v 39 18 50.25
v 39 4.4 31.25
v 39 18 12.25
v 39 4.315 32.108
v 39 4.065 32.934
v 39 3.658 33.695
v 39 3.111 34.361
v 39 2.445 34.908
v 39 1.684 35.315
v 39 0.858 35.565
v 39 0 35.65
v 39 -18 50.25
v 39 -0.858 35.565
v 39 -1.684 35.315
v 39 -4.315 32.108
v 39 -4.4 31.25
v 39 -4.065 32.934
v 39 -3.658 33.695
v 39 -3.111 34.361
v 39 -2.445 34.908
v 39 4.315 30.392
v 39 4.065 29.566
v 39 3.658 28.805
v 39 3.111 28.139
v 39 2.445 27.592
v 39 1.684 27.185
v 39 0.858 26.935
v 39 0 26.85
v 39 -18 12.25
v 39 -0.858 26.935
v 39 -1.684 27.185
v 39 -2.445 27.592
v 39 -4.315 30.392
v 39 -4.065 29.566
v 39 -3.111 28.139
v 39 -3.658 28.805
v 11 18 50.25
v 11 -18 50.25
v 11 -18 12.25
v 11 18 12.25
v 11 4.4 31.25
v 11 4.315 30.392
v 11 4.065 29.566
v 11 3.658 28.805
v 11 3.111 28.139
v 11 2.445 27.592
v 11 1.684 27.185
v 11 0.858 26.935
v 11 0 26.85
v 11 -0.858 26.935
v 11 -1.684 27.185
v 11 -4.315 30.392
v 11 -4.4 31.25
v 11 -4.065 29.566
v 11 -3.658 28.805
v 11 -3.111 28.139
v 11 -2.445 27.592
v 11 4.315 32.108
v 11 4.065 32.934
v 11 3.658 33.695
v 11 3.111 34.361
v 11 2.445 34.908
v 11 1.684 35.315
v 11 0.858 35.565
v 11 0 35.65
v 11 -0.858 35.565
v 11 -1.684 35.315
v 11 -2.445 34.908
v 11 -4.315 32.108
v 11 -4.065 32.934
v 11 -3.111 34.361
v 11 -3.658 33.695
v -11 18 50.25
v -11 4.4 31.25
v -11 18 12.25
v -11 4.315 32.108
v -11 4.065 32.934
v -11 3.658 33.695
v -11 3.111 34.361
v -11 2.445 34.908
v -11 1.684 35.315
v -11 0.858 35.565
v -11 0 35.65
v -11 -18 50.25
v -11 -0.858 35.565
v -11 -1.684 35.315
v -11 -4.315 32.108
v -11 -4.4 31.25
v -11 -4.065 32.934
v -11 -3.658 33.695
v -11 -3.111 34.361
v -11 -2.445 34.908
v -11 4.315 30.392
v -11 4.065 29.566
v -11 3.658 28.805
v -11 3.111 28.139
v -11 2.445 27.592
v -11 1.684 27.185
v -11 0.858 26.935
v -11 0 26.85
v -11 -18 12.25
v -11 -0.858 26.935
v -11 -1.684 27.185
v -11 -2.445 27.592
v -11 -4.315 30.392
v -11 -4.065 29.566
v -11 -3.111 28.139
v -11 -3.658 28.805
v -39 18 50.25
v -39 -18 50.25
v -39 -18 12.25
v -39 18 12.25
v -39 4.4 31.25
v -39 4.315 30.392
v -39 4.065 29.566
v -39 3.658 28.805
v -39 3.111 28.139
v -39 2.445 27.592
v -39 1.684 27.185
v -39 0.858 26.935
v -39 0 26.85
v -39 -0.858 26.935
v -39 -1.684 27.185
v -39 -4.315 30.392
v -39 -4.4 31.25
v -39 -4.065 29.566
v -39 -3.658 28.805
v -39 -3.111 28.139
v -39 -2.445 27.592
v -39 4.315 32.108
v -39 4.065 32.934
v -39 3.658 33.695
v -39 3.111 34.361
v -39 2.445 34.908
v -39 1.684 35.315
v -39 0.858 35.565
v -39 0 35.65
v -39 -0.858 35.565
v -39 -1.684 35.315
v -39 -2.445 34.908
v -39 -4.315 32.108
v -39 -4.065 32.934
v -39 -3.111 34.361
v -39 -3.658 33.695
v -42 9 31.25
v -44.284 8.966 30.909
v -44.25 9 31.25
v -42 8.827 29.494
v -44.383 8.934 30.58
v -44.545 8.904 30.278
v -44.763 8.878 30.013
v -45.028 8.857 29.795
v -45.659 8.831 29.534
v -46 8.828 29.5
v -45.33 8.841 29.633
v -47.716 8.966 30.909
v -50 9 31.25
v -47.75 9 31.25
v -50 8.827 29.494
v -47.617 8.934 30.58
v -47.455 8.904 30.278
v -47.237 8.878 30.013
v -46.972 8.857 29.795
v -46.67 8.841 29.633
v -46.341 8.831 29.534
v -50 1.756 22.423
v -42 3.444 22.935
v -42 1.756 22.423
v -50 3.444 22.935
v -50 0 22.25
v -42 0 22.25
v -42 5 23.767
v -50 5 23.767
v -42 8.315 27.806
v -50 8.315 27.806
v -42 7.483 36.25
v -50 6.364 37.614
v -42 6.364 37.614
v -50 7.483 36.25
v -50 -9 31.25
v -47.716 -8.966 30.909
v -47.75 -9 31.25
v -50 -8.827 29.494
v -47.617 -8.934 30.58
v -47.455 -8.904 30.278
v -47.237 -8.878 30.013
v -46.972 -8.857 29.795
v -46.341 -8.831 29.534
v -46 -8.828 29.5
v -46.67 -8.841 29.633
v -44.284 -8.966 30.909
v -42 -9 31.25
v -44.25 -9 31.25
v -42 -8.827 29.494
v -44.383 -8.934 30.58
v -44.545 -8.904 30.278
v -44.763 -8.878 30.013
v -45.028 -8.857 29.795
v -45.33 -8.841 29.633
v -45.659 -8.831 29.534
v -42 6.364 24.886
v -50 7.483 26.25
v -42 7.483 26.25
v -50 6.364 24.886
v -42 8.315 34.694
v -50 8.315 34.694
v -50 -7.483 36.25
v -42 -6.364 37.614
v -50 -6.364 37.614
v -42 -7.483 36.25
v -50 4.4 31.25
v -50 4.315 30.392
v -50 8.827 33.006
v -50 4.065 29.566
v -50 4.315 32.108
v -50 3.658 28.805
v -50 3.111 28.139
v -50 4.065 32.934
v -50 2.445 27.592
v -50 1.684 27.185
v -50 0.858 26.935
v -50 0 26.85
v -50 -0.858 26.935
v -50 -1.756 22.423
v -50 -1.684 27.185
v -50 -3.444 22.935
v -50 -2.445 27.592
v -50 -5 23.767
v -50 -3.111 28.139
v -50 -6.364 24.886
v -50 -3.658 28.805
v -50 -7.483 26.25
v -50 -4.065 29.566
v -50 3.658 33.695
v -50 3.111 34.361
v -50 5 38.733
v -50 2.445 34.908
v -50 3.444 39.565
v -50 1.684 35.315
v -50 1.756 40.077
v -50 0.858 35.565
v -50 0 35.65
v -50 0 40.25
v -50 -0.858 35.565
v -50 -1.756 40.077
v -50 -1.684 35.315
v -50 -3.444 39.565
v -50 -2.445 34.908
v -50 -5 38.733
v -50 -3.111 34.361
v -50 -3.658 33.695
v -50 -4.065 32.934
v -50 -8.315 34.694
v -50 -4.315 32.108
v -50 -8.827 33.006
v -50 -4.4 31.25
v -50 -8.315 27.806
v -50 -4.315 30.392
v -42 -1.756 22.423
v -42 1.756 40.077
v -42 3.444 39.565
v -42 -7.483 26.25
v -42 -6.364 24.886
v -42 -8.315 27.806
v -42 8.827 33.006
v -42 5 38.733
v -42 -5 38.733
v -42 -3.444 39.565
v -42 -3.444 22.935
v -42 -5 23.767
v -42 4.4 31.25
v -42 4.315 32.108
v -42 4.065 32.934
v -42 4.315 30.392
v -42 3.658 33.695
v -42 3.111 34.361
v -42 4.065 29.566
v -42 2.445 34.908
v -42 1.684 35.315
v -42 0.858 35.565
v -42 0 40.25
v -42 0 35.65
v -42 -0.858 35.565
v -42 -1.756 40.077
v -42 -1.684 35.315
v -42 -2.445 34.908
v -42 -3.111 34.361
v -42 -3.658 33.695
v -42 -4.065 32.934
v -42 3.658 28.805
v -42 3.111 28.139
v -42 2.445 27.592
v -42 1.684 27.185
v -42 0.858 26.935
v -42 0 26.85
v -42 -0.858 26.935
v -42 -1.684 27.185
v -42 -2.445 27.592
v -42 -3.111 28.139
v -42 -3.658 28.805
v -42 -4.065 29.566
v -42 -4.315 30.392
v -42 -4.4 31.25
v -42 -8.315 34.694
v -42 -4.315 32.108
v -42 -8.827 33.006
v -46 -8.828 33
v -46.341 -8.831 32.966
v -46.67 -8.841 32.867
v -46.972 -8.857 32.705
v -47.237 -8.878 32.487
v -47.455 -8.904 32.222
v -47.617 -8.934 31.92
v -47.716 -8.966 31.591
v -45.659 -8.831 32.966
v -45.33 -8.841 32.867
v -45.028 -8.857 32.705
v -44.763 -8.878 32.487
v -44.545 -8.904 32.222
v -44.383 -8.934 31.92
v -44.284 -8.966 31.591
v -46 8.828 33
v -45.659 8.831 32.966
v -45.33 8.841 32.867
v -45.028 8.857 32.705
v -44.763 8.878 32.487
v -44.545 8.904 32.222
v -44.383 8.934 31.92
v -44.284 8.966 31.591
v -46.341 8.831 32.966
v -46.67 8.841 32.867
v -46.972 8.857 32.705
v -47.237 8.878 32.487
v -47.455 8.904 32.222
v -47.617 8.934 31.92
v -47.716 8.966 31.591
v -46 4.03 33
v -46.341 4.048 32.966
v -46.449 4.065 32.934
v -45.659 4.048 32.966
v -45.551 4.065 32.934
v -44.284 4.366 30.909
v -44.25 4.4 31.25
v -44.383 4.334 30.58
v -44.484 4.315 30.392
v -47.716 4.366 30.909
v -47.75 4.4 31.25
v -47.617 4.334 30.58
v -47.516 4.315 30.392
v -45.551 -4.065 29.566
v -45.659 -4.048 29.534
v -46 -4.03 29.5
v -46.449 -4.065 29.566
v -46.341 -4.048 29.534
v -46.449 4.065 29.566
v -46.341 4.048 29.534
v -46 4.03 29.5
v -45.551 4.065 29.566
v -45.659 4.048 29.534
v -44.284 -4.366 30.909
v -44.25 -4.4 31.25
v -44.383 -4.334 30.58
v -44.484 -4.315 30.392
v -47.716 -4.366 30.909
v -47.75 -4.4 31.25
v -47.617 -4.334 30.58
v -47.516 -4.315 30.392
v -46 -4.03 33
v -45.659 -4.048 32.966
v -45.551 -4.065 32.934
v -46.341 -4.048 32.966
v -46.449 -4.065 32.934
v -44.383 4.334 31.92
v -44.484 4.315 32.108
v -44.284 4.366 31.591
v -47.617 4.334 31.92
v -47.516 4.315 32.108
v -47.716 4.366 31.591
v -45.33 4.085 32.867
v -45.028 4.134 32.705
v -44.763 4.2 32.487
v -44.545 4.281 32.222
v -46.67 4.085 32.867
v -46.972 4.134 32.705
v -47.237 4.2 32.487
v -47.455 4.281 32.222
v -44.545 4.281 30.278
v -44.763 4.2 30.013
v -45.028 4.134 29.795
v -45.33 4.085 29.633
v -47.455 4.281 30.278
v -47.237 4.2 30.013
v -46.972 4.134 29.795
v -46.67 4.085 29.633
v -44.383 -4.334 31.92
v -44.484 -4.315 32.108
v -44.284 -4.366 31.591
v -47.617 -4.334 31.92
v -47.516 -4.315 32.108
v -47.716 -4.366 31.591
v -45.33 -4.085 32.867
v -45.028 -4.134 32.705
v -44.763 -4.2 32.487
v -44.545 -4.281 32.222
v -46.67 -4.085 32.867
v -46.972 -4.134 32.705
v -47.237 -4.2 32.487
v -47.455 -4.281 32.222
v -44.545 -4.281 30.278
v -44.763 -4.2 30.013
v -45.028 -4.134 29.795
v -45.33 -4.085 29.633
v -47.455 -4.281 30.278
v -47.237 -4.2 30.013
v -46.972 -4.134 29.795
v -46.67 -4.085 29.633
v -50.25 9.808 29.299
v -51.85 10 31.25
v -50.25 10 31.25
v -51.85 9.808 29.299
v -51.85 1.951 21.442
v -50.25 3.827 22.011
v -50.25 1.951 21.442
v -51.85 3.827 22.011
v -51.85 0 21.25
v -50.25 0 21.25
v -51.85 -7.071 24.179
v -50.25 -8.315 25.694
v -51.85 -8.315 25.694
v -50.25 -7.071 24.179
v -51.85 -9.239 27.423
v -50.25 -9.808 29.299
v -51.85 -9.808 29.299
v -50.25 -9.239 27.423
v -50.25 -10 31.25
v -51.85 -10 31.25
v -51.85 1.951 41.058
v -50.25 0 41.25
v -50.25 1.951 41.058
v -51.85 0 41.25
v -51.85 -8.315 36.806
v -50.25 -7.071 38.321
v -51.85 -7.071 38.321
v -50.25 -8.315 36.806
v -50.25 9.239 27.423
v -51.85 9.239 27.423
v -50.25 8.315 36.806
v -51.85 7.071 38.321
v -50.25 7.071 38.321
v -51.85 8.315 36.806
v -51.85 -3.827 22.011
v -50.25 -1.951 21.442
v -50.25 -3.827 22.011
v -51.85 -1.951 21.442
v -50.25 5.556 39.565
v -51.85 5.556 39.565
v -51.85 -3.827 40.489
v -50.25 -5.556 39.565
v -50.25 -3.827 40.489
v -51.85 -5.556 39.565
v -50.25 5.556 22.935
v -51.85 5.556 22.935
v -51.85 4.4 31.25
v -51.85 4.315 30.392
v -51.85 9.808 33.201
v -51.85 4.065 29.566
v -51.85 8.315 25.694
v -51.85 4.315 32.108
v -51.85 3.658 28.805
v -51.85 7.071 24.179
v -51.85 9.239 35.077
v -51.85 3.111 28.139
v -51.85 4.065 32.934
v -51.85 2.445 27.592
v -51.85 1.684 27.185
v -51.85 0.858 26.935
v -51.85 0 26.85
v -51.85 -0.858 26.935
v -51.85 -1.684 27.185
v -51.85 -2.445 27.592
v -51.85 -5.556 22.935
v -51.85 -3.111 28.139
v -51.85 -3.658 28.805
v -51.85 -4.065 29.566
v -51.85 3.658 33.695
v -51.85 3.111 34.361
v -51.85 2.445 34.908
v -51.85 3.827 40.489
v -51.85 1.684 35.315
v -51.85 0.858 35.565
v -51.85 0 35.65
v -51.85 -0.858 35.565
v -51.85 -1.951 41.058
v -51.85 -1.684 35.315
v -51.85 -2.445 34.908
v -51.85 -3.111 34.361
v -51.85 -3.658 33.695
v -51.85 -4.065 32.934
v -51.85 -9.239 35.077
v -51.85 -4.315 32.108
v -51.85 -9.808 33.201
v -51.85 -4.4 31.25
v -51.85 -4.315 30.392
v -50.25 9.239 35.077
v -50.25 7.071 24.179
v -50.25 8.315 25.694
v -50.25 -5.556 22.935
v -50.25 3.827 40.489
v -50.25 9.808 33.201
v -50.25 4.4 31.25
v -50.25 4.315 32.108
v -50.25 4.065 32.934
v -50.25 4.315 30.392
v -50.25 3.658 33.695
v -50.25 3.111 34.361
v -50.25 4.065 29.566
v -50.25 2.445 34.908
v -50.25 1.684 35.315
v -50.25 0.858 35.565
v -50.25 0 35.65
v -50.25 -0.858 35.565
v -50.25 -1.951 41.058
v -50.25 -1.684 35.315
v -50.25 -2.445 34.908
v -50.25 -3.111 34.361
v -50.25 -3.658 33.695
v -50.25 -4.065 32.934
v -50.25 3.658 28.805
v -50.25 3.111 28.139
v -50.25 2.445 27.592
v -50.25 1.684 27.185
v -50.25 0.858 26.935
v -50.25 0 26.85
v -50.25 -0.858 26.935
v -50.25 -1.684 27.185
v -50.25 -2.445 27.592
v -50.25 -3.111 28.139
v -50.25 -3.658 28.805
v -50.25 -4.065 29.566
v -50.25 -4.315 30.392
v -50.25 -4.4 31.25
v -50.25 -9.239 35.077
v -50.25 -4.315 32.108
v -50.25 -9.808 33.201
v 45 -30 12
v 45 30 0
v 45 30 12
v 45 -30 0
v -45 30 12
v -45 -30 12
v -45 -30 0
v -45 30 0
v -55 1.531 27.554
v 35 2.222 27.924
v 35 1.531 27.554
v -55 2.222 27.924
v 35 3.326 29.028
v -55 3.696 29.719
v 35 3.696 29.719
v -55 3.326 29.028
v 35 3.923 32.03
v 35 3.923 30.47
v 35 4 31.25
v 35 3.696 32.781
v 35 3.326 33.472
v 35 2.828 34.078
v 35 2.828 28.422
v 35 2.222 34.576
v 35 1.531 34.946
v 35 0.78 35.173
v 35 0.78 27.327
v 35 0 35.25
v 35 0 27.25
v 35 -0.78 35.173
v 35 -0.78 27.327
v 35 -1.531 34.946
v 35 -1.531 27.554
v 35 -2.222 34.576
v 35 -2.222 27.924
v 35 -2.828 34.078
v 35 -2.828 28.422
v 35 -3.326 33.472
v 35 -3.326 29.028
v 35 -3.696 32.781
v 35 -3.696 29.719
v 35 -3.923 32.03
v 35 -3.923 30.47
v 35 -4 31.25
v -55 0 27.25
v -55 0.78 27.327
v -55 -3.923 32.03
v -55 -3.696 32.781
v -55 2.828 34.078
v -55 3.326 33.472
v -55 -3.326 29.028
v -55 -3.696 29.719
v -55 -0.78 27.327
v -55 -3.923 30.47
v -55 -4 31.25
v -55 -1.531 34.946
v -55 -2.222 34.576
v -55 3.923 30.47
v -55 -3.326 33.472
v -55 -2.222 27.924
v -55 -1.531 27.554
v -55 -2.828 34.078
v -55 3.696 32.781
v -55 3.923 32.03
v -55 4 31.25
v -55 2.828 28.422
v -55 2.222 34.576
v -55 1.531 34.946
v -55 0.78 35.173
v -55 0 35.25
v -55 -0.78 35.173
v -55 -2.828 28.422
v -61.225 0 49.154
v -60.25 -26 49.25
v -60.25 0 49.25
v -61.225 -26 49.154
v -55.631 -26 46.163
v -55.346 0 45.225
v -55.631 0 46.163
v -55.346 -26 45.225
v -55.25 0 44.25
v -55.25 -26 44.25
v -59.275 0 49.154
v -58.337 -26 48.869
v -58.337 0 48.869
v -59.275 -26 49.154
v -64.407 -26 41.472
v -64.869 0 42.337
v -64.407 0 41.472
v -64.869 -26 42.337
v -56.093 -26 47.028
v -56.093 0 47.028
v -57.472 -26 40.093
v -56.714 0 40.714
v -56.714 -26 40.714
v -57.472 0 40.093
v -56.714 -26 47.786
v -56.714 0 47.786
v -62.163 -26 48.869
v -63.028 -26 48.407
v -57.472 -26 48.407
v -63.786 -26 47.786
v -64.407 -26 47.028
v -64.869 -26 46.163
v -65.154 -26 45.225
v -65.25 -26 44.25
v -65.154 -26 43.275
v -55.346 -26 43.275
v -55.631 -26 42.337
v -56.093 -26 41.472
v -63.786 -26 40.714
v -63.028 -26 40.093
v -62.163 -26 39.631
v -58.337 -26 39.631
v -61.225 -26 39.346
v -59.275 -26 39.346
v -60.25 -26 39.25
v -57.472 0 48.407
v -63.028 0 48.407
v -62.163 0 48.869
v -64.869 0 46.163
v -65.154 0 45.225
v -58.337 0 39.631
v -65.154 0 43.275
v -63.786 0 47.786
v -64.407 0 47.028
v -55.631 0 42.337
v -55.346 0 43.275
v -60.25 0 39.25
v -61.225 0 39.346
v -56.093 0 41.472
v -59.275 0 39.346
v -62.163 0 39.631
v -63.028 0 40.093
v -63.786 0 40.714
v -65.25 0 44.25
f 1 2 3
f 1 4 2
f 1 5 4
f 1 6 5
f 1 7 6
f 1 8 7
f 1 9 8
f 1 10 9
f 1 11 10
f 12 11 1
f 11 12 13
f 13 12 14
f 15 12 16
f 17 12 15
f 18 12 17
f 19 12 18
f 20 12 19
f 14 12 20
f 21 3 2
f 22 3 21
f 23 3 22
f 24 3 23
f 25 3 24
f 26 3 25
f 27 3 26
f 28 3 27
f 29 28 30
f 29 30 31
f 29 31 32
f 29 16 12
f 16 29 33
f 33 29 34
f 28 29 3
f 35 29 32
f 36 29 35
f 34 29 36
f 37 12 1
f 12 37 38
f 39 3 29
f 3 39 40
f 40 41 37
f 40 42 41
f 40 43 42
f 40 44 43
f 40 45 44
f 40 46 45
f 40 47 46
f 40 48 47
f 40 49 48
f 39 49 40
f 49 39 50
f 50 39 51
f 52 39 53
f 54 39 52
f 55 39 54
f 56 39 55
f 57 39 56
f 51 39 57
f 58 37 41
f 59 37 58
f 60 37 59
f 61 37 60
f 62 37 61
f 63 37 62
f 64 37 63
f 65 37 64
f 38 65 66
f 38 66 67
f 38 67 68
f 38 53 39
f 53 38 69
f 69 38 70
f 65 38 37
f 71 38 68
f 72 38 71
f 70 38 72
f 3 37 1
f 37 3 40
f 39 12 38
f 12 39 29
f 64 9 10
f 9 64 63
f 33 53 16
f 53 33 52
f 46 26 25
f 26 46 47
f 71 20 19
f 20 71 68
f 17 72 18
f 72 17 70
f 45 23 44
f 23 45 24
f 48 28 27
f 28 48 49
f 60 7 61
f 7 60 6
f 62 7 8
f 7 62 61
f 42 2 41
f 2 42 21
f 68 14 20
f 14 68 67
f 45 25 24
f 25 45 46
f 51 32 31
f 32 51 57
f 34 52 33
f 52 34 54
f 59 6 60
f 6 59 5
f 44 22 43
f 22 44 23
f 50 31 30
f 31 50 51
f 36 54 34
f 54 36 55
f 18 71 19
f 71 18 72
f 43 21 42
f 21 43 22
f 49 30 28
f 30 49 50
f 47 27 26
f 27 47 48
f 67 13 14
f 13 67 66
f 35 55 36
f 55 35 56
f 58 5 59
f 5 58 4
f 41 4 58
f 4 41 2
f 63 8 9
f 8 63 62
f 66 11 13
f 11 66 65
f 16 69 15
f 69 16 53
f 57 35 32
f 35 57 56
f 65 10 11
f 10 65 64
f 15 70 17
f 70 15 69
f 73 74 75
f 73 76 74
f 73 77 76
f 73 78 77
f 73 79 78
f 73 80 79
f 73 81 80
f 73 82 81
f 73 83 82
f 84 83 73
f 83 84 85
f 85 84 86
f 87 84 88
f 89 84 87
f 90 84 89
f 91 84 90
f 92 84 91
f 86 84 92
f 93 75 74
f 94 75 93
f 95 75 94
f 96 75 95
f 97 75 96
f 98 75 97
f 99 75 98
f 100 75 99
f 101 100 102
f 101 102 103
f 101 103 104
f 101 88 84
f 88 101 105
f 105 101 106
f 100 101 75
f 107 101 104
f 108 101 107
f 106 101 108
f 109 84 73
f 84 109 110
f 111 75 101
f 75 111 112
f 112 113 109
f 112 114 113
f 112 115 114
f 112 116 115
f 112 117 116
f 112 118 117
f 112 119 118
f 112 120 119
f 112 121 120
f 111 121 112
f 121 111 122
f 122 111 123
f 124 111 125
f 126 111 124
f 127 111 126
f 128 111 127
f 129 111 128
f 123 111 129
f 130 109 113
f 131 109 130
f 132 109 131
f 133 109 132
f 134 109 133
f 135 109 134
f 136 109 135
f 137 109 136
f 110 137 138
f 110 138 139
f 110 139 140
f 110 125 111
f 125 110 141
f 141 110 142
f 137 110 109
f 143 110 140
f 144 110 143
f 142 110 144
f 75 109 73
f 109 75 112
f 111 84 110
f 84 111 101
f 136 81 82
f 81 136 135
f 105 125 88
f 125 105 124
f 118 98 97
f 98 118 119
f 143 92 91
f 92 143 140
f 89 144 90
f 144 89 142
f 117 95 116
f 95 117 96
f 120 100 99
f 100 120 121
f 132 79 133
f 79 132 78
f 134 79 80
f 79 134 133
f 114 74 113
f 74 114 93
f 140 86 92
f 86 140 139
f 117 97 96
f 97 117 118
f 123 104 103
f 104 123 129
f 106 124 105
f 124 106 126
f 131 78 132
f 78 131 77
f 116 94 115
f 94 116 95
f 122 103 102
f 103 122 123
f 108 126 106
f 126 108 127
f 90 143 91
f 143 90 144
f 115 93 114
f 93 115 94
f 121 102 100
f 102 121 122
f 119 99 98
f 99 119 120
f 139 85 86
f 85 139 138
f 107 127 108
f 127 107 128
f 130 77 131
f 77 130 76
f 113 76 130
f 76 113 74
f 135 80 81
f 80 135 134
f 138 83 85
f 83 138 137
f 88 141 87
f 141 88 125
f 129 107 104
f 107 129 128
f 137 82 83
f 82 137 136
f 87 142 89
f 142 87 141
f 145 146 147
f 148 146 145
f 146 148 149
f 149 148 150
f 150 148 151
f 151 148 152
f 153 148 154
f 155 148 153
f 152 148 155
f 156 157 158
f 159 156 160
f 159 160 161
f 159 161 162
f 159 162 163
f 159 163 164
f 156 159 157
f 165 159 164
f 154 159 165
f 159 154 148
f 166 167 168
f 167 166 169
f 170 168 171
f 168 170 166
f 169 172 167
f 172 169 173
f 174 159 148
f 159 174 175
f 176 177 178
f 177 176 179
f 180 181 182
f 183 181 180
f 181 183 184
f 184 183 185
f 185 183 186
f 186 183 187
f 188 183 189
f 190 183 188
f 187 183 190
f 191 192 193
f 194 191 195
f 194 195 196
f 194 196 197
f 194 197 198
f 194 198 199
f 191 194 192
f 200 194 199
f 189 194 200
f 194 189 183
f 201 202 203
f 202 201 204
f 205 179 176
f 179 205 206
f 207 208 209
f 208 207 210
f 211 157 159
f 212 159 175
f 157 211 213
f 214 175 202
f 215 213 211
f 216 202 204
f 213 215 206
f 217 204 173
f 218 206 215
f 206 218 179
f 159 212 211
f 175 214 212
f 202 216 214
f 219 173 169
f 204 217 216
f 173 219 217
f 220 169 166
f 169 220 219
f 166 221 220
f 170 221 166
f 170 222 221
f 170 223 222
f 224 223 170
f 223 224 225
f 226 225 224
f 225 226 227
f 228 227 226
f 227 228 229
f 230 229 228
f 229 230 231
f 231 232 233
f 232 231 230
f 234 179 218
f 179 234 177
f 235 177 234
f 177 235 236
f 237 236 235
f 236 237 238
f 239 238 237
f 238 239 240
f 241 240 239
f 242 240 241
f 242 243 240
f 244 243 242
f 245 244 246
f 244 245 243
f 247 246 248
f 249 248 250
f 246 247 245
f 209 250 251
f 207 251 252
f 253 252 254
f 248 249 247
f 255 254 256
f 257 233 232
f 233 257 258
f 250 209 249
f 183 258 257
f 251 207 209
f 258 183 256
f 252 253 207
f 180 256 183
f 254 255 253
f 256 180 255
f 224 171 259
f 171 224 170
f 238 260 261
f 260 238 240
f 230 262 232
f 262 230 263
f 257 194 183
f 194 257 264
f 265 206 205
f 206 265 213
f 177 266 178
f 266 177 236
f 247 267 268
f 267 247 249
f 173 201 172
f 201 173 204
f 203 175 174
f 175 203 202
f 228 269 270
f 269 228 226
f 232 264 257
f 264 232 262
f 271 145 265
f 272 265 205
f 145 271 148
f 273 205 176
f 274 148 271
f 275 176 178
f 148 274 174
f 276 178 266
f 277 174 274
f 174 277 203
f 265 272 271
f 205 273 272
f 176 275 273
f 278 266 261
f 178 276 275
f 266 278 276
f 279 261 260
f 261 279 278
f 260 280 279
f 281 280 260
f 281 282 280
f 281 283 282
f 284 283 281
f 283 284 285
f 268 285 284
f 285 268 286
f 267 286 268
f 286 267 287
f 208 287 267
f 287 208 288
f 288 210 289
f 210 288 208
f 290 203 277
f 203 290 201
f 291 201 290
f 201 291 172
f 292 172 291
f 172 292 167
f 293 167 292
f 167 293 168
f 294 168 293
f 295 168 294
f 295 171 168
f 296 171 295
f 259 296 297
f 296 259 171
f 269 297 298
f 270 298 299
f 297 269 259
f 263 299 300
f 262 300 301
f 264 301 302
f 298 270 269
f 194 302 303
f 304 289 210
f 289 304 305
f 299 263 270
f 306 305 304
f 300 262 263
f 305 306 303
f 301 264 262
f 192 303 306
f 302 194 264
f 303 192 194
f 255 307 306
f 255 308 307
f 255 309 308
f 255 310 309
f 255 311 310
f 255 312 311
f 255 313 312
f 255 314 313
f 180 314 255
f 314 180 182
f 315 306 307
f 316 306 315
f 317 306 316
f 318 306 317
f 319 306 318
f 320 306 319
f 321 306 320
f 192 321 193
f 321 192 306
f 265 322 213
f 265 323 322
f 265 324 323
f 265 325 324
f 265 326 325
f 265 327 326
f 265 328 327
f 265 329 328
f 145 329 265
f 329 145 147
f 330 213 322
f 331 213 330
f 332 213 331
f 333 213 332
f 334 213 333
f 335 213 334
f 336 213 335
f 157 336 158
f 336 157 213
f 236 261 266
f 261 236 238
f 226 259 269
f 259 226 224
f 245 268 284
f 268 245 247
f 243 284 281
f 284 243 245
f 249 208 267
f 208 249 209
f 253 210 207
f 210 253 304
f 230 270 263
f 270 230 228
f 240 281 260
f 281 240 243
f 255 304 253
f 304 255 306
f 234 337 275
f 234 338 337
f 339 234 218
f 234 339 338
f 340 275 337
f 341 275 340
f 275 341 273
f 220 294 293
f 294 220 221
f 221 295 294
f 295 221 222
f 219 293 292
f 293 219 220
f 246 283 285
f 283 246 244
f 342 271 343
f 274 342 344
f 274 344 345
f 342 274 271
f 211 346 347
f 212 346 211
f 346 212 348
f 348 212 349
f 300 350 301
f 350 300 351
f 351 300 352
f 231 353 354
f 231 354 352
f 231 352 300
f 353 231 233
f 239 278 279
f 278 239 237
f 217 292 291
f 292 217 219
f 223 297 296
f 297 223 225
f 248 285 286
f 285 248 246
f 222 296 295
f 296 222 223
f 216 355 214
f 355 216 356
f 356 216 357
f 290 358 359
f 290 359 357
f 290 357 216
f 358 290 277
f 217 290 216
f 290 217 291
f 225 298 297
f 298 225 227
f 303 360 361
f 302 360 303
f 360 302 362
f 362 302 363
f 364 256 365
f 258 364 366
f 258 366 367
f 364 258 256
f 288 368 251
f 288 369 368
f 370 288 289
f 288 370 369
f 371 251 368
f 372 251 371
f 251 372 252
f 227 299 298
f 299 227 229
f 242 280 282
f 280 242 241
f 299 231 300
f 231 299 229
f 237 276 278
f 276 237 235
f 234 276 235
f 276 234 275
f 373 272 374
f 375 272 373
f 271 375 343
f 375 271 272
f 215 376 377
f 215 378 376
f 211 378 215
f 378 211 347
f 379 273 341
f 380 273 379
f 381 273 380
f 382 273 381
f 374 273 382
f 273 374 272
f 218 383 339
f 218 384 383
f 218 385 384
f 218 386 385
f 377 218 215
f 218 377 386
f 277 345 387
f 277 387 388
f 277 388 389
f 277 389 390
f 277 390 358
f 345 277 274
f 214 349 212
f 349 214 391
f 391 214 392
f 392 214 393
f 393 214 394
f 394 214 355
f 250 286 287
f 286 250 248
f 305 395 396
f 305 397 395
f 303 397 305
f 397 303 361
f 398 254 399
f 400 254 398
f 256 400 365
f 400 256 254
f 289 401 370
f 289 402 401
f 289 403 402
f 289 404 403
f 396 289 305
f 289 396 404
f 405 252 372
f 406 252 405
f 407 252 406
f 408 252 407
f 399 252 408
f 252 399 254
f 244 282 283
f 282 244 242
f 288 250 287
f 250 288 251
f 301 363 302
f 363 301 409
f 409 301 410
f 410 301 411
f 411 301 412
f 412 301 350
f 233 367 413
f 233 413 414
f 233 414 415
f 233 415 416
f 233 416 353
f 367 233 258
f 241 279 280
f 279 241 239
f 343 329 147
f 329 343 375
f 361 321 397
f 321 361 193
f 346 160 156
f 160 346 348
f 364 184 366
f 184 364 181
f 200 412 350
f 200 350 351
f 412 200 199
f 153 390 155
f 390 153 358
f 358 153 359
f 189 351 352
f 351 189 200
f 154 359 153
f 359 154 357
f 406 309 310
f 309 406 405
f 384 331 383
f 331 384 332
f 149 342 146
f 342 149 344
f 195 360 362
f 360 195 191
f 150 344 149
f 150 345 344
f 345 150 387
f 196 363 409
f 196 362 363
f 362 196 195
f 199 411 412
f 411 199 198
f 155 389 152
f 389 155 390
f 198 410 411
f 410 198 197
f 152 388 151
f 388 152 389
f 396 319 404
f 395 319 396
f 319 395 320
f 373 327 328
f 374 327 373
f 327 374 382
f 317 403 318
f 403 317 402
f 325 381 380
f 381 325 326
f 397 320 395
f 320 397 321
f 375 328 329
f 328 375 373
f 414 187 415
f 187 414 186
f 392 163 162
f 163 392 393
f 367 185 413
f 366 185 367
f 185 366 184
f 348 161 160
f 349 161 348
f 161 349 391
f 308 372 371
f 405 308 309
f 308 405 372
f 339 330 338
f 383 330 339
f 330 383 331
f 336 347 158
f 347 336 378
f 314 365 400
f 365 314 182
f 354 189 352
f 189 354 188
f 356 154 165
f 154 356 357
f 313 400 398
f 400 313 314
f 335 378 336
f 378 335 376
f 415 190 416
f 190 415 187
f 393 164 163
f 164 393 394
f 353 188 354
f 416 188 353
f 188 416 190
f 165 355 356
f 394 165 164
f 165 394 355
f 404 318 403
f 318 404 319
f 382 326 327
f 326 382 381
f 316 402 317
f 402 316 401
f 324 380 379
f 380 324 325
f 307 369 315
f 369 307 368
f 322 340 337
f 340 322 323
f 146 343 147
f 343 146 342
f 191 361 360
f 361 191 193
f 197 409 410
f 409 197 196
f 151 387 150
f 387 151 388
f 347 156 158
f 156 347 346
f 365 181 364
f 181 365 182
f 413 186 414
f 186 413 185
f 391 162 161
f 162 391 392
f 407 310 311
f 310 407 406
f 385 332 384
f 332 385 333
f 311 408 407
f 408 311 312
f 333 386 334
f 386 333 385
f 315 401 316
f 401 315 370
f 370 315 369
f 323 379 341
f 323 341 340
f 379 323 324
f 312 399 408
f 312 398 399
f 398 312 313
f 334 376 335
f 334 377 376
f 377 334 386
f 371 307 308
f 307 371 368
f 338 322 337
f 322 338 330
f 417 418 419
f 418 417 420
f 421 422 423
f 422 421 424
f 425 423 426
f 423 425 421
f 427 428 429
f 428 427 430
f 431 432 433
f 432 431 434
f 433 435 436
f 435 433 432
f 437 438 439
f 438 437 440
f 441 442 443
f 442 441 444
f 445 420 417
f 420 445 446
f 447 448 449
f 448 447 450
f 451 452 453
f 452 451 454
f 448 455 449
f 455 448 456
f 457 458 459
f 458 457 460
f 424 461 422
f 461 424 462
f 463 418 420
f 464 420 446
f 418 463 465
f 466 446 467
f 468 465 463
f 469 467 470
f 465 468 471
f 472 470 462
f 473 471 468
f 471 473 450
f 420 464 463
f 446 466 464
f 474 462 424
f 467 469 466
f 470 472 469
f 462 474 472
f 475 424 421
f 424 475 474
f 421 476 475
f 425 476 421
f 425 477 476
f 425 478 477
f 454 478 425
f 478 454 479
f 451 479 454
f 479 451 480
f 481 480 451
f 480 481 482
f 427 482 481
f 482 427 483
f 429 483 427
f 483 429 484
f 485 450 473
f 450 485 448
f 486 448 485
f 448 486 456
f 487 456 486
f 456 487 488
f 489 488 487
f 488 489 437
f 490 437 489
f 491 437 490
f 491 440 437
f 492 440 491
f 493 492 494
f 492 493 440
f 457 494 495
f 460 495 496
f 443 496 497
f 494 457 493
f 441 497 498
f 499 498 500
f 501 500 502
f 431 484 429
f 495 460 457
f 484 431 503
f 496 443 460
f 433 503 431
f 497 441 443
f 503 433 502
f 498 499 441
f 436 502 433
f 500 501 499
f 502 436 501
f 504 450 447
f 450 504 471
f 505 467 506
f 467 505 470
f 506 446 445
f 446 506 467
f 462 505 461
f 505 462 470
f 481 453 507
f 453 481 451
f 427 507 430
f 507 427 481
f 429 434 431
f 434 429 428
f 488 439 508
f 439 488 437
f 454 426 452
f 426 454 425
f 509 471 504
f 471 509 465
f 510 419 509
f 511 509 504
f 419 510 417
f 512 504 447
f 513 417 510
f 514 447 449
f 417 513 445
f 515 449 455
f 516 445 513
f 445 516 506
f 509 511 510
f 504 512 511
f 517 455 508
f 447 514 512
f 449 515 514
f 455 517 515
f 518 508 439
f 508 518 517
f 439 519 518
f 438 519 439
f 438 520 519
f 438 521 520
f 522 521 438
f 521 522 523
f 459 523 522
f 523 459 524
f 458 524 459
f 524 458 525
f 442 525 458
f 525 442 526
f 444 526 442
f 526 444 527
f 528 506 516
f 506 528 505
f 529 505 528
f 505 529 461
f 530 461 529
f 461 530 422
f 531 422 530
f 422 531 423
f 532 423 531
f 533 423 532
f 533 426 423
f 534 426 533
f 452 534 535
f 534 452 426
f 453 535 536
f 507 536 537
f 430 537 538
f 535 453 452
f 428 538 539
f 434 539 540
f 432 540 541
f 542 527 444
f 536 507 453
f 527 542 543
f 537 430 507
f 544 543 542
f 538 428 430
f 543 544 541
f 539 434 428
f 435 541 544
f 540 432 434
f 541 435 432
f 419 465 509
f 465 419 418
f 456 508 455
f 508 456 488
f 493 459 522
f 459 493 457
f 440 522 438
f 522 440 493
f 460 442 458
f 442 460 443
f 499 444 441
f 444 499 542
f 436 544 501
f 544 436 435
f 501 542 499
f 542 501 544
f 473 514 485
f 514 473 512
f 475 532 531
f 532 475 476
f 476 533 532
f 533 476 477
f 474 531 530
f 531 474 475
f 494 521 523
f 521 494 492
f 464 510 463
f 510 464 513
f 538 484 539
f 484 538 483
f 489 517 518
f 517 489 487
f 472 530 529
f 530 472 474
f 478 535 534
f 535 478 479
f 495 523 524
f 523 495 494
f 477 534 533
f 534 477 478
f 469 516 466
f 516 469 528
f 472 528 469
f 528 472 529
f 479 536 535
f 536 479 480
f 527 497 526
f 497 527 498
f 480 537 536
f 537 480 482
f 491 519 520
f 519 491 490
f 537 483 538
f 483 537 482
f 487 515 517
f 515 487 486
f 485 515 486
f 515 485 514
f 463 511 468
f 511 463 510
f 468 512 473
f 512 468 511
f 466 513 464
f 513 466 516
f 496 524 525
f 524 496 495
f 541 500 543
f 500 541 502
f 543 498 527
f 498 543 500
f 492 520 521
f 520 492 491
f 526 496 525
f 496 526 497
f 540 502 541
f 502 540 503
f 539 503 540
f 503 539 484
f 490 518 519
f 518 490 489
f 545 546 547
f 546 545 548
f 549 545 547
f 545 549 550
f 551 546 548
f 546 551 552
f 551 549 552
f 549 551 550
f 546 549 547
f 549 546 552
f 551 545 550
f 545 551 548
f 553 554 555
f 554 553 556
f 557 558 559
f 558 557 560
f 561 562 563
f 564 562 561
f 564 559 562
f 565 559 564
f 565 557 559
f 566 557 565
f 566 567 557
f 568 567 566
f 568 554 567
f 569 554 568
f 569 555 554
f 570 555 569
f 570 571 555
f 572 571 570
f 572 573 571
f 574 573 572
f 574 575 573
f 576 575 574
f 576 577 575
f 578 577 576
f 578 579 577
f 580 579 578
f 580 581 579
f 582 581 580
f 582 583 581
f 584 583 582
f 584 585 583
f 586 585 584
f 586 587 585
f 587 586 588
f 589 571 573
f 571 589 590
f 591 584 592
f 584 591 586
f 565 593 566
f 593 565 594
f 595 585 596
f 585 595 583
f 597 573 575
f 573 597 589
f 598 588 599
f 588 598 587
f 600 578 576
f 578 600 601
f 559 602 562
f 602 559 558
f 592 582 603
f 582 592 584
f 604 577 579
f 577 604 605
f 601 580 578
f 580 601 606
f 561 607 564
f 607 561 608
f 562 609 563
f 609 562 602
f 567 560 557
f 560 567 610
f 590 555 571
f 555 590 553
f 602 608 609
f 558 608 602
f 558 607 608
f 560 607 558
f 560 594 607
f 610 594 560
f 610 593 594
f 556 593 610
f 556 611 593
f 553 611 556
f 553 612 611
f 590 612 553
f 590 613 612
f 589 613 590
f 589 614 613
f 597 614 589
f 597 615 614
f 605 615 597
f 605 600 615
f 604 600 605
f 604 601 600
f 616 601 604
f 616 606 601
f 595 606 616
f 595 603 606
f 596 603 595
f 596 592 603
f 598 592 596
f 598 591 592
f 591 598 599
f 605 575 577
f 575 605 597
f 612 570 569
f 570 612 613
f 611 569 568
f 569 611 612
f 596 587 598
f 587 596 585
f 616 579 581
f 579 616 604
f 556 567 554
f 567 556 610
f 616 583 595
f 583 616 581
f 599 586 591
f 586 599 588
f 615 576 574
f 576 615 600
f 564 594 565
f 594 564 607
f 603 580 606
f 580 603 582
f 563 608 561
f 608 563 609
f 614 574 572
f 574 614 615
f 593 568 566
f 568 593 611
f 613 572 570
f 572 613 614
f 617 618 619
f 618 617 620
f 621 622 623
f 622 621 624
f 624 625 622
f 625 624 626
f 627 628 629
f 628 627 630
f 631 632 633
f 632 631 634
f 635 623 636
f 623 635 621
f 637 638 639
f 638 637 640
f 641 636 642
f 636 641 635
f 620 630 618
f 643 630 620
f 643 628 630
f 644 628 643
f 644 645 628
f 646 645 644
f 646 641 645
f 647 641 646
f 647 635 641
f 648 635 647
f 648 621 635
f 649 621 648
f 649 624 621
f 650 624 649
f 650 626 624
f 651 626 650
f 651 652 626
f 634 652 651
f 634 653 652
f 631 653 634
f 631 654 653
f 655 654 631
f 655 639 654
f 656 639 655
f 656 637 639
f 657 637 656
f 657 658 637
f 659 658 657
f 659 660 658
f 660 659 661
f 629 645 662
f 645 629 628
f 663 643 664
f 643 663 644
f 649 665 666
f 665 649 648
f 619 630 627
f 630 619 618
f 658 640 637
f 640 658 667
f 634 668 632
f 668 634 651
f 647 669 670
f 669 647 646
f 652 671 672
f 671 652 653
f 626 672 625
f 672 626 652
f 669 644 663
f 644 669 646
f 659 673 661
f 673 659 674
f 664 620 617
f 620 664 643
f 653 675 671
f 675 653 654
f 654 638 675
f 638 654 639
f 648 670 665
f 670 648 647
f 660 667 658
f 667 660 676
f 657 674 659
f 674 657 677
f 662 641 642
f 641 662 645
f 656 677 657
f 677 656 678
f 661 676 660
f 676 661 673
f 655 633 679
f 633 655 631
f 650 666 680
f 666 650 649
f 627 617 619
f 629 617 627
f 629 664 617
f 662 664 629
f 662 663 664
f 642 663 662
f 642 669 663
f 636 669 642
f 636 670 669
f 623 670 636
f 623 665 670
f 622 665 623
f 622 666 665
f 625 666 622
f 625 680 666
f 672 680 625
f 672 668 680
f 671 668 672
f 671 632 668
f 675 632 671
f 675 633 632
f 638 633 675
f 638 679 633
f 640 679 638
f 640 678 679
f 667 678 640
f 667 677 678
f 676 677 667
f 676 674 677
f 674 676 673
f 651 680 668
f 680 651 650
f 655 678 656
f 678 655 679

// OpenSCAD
$fn = 32;

// ------------------------------------------------------------------------
// Machine vise: screw d8, jaws 28 x 38 mm
// Every part is its own module, assembly() places every instance.
// ------------------------------------------------------------------------

// --- part 1 ---
module vise_bed() {
  difference() {
    translate([-45, -30, 0]) cube([90, 60, 12]);
  }
}

// --- part 2 ---
module vise_jaw() {
  difference() {
    translate([-14, -18, 0]) cube([28, 36, 38]);
    translate([0, 0, 19]) rotate([0, 90, 0]) cylinder(h = 30, d = 8.8, center = true);
  }
}

// --- part 3 ---
module vise_screw() {
  translate([0, 0, -45]) cylinder(h = 90, d = 8);
}

// --- part 4 ---
module screw_collar() {
  difference() {
    cylinder(h = 8, d = 18);
    translate([0, 0, -1]) cylinder(h = 10, d = 8.8);
    translate([0, 0, 4]) rotate([90, 0, 0]) cylinder(h = 20, d = 3.5, center = true);
  }
}

// --- part 5 ---
module screw_washer() {
  difference() {
      translate([0, 0, 0]) cylinder(h = 1.6, d = 20);
      translate([0, 0, -1]) cylinder(h = 3.6, d = 8.8);
    }
}

// --- part 6 ---
module vise_handle() {
  cylinder(h = 26, d = 10);
}

// --- assembly ---
module assembly() {
  color([0.80, 0.24, 0.20]) translate([0, 0, 0]) rotate([0, 0, 0]) vise_bed();
  color([0.20, 0.45, 0.75]) translate([25, 0, 12.25]) rotate([0, 0, 0]) vise_jaw();
  color([0.25, 0.62, 0.32]) translate([-25, 0, 12.25]) rotate([0, 0, 0]) vise_jaw();
  color([0.92, 0.70, 0.18]) translate([-10, 0, 31.25]) rotate([0, 90, 0]) vise_screw();
  color([0.58, 0.35, 0.70]) translate([-50, 0, 31.25]) rotate([0, 90, 0]) screw_collar();
  color([0.16, 0.66, 0.66]) translate([-51.85, 0, 31.25]) rotate([0, 90, 0]) screw_washer();
  color([0.85, 0.48, 0.18]) translate([-60.25, 0, 44.25]) rotate([90, 0, 0]) vise_handle();
}

assembly();
